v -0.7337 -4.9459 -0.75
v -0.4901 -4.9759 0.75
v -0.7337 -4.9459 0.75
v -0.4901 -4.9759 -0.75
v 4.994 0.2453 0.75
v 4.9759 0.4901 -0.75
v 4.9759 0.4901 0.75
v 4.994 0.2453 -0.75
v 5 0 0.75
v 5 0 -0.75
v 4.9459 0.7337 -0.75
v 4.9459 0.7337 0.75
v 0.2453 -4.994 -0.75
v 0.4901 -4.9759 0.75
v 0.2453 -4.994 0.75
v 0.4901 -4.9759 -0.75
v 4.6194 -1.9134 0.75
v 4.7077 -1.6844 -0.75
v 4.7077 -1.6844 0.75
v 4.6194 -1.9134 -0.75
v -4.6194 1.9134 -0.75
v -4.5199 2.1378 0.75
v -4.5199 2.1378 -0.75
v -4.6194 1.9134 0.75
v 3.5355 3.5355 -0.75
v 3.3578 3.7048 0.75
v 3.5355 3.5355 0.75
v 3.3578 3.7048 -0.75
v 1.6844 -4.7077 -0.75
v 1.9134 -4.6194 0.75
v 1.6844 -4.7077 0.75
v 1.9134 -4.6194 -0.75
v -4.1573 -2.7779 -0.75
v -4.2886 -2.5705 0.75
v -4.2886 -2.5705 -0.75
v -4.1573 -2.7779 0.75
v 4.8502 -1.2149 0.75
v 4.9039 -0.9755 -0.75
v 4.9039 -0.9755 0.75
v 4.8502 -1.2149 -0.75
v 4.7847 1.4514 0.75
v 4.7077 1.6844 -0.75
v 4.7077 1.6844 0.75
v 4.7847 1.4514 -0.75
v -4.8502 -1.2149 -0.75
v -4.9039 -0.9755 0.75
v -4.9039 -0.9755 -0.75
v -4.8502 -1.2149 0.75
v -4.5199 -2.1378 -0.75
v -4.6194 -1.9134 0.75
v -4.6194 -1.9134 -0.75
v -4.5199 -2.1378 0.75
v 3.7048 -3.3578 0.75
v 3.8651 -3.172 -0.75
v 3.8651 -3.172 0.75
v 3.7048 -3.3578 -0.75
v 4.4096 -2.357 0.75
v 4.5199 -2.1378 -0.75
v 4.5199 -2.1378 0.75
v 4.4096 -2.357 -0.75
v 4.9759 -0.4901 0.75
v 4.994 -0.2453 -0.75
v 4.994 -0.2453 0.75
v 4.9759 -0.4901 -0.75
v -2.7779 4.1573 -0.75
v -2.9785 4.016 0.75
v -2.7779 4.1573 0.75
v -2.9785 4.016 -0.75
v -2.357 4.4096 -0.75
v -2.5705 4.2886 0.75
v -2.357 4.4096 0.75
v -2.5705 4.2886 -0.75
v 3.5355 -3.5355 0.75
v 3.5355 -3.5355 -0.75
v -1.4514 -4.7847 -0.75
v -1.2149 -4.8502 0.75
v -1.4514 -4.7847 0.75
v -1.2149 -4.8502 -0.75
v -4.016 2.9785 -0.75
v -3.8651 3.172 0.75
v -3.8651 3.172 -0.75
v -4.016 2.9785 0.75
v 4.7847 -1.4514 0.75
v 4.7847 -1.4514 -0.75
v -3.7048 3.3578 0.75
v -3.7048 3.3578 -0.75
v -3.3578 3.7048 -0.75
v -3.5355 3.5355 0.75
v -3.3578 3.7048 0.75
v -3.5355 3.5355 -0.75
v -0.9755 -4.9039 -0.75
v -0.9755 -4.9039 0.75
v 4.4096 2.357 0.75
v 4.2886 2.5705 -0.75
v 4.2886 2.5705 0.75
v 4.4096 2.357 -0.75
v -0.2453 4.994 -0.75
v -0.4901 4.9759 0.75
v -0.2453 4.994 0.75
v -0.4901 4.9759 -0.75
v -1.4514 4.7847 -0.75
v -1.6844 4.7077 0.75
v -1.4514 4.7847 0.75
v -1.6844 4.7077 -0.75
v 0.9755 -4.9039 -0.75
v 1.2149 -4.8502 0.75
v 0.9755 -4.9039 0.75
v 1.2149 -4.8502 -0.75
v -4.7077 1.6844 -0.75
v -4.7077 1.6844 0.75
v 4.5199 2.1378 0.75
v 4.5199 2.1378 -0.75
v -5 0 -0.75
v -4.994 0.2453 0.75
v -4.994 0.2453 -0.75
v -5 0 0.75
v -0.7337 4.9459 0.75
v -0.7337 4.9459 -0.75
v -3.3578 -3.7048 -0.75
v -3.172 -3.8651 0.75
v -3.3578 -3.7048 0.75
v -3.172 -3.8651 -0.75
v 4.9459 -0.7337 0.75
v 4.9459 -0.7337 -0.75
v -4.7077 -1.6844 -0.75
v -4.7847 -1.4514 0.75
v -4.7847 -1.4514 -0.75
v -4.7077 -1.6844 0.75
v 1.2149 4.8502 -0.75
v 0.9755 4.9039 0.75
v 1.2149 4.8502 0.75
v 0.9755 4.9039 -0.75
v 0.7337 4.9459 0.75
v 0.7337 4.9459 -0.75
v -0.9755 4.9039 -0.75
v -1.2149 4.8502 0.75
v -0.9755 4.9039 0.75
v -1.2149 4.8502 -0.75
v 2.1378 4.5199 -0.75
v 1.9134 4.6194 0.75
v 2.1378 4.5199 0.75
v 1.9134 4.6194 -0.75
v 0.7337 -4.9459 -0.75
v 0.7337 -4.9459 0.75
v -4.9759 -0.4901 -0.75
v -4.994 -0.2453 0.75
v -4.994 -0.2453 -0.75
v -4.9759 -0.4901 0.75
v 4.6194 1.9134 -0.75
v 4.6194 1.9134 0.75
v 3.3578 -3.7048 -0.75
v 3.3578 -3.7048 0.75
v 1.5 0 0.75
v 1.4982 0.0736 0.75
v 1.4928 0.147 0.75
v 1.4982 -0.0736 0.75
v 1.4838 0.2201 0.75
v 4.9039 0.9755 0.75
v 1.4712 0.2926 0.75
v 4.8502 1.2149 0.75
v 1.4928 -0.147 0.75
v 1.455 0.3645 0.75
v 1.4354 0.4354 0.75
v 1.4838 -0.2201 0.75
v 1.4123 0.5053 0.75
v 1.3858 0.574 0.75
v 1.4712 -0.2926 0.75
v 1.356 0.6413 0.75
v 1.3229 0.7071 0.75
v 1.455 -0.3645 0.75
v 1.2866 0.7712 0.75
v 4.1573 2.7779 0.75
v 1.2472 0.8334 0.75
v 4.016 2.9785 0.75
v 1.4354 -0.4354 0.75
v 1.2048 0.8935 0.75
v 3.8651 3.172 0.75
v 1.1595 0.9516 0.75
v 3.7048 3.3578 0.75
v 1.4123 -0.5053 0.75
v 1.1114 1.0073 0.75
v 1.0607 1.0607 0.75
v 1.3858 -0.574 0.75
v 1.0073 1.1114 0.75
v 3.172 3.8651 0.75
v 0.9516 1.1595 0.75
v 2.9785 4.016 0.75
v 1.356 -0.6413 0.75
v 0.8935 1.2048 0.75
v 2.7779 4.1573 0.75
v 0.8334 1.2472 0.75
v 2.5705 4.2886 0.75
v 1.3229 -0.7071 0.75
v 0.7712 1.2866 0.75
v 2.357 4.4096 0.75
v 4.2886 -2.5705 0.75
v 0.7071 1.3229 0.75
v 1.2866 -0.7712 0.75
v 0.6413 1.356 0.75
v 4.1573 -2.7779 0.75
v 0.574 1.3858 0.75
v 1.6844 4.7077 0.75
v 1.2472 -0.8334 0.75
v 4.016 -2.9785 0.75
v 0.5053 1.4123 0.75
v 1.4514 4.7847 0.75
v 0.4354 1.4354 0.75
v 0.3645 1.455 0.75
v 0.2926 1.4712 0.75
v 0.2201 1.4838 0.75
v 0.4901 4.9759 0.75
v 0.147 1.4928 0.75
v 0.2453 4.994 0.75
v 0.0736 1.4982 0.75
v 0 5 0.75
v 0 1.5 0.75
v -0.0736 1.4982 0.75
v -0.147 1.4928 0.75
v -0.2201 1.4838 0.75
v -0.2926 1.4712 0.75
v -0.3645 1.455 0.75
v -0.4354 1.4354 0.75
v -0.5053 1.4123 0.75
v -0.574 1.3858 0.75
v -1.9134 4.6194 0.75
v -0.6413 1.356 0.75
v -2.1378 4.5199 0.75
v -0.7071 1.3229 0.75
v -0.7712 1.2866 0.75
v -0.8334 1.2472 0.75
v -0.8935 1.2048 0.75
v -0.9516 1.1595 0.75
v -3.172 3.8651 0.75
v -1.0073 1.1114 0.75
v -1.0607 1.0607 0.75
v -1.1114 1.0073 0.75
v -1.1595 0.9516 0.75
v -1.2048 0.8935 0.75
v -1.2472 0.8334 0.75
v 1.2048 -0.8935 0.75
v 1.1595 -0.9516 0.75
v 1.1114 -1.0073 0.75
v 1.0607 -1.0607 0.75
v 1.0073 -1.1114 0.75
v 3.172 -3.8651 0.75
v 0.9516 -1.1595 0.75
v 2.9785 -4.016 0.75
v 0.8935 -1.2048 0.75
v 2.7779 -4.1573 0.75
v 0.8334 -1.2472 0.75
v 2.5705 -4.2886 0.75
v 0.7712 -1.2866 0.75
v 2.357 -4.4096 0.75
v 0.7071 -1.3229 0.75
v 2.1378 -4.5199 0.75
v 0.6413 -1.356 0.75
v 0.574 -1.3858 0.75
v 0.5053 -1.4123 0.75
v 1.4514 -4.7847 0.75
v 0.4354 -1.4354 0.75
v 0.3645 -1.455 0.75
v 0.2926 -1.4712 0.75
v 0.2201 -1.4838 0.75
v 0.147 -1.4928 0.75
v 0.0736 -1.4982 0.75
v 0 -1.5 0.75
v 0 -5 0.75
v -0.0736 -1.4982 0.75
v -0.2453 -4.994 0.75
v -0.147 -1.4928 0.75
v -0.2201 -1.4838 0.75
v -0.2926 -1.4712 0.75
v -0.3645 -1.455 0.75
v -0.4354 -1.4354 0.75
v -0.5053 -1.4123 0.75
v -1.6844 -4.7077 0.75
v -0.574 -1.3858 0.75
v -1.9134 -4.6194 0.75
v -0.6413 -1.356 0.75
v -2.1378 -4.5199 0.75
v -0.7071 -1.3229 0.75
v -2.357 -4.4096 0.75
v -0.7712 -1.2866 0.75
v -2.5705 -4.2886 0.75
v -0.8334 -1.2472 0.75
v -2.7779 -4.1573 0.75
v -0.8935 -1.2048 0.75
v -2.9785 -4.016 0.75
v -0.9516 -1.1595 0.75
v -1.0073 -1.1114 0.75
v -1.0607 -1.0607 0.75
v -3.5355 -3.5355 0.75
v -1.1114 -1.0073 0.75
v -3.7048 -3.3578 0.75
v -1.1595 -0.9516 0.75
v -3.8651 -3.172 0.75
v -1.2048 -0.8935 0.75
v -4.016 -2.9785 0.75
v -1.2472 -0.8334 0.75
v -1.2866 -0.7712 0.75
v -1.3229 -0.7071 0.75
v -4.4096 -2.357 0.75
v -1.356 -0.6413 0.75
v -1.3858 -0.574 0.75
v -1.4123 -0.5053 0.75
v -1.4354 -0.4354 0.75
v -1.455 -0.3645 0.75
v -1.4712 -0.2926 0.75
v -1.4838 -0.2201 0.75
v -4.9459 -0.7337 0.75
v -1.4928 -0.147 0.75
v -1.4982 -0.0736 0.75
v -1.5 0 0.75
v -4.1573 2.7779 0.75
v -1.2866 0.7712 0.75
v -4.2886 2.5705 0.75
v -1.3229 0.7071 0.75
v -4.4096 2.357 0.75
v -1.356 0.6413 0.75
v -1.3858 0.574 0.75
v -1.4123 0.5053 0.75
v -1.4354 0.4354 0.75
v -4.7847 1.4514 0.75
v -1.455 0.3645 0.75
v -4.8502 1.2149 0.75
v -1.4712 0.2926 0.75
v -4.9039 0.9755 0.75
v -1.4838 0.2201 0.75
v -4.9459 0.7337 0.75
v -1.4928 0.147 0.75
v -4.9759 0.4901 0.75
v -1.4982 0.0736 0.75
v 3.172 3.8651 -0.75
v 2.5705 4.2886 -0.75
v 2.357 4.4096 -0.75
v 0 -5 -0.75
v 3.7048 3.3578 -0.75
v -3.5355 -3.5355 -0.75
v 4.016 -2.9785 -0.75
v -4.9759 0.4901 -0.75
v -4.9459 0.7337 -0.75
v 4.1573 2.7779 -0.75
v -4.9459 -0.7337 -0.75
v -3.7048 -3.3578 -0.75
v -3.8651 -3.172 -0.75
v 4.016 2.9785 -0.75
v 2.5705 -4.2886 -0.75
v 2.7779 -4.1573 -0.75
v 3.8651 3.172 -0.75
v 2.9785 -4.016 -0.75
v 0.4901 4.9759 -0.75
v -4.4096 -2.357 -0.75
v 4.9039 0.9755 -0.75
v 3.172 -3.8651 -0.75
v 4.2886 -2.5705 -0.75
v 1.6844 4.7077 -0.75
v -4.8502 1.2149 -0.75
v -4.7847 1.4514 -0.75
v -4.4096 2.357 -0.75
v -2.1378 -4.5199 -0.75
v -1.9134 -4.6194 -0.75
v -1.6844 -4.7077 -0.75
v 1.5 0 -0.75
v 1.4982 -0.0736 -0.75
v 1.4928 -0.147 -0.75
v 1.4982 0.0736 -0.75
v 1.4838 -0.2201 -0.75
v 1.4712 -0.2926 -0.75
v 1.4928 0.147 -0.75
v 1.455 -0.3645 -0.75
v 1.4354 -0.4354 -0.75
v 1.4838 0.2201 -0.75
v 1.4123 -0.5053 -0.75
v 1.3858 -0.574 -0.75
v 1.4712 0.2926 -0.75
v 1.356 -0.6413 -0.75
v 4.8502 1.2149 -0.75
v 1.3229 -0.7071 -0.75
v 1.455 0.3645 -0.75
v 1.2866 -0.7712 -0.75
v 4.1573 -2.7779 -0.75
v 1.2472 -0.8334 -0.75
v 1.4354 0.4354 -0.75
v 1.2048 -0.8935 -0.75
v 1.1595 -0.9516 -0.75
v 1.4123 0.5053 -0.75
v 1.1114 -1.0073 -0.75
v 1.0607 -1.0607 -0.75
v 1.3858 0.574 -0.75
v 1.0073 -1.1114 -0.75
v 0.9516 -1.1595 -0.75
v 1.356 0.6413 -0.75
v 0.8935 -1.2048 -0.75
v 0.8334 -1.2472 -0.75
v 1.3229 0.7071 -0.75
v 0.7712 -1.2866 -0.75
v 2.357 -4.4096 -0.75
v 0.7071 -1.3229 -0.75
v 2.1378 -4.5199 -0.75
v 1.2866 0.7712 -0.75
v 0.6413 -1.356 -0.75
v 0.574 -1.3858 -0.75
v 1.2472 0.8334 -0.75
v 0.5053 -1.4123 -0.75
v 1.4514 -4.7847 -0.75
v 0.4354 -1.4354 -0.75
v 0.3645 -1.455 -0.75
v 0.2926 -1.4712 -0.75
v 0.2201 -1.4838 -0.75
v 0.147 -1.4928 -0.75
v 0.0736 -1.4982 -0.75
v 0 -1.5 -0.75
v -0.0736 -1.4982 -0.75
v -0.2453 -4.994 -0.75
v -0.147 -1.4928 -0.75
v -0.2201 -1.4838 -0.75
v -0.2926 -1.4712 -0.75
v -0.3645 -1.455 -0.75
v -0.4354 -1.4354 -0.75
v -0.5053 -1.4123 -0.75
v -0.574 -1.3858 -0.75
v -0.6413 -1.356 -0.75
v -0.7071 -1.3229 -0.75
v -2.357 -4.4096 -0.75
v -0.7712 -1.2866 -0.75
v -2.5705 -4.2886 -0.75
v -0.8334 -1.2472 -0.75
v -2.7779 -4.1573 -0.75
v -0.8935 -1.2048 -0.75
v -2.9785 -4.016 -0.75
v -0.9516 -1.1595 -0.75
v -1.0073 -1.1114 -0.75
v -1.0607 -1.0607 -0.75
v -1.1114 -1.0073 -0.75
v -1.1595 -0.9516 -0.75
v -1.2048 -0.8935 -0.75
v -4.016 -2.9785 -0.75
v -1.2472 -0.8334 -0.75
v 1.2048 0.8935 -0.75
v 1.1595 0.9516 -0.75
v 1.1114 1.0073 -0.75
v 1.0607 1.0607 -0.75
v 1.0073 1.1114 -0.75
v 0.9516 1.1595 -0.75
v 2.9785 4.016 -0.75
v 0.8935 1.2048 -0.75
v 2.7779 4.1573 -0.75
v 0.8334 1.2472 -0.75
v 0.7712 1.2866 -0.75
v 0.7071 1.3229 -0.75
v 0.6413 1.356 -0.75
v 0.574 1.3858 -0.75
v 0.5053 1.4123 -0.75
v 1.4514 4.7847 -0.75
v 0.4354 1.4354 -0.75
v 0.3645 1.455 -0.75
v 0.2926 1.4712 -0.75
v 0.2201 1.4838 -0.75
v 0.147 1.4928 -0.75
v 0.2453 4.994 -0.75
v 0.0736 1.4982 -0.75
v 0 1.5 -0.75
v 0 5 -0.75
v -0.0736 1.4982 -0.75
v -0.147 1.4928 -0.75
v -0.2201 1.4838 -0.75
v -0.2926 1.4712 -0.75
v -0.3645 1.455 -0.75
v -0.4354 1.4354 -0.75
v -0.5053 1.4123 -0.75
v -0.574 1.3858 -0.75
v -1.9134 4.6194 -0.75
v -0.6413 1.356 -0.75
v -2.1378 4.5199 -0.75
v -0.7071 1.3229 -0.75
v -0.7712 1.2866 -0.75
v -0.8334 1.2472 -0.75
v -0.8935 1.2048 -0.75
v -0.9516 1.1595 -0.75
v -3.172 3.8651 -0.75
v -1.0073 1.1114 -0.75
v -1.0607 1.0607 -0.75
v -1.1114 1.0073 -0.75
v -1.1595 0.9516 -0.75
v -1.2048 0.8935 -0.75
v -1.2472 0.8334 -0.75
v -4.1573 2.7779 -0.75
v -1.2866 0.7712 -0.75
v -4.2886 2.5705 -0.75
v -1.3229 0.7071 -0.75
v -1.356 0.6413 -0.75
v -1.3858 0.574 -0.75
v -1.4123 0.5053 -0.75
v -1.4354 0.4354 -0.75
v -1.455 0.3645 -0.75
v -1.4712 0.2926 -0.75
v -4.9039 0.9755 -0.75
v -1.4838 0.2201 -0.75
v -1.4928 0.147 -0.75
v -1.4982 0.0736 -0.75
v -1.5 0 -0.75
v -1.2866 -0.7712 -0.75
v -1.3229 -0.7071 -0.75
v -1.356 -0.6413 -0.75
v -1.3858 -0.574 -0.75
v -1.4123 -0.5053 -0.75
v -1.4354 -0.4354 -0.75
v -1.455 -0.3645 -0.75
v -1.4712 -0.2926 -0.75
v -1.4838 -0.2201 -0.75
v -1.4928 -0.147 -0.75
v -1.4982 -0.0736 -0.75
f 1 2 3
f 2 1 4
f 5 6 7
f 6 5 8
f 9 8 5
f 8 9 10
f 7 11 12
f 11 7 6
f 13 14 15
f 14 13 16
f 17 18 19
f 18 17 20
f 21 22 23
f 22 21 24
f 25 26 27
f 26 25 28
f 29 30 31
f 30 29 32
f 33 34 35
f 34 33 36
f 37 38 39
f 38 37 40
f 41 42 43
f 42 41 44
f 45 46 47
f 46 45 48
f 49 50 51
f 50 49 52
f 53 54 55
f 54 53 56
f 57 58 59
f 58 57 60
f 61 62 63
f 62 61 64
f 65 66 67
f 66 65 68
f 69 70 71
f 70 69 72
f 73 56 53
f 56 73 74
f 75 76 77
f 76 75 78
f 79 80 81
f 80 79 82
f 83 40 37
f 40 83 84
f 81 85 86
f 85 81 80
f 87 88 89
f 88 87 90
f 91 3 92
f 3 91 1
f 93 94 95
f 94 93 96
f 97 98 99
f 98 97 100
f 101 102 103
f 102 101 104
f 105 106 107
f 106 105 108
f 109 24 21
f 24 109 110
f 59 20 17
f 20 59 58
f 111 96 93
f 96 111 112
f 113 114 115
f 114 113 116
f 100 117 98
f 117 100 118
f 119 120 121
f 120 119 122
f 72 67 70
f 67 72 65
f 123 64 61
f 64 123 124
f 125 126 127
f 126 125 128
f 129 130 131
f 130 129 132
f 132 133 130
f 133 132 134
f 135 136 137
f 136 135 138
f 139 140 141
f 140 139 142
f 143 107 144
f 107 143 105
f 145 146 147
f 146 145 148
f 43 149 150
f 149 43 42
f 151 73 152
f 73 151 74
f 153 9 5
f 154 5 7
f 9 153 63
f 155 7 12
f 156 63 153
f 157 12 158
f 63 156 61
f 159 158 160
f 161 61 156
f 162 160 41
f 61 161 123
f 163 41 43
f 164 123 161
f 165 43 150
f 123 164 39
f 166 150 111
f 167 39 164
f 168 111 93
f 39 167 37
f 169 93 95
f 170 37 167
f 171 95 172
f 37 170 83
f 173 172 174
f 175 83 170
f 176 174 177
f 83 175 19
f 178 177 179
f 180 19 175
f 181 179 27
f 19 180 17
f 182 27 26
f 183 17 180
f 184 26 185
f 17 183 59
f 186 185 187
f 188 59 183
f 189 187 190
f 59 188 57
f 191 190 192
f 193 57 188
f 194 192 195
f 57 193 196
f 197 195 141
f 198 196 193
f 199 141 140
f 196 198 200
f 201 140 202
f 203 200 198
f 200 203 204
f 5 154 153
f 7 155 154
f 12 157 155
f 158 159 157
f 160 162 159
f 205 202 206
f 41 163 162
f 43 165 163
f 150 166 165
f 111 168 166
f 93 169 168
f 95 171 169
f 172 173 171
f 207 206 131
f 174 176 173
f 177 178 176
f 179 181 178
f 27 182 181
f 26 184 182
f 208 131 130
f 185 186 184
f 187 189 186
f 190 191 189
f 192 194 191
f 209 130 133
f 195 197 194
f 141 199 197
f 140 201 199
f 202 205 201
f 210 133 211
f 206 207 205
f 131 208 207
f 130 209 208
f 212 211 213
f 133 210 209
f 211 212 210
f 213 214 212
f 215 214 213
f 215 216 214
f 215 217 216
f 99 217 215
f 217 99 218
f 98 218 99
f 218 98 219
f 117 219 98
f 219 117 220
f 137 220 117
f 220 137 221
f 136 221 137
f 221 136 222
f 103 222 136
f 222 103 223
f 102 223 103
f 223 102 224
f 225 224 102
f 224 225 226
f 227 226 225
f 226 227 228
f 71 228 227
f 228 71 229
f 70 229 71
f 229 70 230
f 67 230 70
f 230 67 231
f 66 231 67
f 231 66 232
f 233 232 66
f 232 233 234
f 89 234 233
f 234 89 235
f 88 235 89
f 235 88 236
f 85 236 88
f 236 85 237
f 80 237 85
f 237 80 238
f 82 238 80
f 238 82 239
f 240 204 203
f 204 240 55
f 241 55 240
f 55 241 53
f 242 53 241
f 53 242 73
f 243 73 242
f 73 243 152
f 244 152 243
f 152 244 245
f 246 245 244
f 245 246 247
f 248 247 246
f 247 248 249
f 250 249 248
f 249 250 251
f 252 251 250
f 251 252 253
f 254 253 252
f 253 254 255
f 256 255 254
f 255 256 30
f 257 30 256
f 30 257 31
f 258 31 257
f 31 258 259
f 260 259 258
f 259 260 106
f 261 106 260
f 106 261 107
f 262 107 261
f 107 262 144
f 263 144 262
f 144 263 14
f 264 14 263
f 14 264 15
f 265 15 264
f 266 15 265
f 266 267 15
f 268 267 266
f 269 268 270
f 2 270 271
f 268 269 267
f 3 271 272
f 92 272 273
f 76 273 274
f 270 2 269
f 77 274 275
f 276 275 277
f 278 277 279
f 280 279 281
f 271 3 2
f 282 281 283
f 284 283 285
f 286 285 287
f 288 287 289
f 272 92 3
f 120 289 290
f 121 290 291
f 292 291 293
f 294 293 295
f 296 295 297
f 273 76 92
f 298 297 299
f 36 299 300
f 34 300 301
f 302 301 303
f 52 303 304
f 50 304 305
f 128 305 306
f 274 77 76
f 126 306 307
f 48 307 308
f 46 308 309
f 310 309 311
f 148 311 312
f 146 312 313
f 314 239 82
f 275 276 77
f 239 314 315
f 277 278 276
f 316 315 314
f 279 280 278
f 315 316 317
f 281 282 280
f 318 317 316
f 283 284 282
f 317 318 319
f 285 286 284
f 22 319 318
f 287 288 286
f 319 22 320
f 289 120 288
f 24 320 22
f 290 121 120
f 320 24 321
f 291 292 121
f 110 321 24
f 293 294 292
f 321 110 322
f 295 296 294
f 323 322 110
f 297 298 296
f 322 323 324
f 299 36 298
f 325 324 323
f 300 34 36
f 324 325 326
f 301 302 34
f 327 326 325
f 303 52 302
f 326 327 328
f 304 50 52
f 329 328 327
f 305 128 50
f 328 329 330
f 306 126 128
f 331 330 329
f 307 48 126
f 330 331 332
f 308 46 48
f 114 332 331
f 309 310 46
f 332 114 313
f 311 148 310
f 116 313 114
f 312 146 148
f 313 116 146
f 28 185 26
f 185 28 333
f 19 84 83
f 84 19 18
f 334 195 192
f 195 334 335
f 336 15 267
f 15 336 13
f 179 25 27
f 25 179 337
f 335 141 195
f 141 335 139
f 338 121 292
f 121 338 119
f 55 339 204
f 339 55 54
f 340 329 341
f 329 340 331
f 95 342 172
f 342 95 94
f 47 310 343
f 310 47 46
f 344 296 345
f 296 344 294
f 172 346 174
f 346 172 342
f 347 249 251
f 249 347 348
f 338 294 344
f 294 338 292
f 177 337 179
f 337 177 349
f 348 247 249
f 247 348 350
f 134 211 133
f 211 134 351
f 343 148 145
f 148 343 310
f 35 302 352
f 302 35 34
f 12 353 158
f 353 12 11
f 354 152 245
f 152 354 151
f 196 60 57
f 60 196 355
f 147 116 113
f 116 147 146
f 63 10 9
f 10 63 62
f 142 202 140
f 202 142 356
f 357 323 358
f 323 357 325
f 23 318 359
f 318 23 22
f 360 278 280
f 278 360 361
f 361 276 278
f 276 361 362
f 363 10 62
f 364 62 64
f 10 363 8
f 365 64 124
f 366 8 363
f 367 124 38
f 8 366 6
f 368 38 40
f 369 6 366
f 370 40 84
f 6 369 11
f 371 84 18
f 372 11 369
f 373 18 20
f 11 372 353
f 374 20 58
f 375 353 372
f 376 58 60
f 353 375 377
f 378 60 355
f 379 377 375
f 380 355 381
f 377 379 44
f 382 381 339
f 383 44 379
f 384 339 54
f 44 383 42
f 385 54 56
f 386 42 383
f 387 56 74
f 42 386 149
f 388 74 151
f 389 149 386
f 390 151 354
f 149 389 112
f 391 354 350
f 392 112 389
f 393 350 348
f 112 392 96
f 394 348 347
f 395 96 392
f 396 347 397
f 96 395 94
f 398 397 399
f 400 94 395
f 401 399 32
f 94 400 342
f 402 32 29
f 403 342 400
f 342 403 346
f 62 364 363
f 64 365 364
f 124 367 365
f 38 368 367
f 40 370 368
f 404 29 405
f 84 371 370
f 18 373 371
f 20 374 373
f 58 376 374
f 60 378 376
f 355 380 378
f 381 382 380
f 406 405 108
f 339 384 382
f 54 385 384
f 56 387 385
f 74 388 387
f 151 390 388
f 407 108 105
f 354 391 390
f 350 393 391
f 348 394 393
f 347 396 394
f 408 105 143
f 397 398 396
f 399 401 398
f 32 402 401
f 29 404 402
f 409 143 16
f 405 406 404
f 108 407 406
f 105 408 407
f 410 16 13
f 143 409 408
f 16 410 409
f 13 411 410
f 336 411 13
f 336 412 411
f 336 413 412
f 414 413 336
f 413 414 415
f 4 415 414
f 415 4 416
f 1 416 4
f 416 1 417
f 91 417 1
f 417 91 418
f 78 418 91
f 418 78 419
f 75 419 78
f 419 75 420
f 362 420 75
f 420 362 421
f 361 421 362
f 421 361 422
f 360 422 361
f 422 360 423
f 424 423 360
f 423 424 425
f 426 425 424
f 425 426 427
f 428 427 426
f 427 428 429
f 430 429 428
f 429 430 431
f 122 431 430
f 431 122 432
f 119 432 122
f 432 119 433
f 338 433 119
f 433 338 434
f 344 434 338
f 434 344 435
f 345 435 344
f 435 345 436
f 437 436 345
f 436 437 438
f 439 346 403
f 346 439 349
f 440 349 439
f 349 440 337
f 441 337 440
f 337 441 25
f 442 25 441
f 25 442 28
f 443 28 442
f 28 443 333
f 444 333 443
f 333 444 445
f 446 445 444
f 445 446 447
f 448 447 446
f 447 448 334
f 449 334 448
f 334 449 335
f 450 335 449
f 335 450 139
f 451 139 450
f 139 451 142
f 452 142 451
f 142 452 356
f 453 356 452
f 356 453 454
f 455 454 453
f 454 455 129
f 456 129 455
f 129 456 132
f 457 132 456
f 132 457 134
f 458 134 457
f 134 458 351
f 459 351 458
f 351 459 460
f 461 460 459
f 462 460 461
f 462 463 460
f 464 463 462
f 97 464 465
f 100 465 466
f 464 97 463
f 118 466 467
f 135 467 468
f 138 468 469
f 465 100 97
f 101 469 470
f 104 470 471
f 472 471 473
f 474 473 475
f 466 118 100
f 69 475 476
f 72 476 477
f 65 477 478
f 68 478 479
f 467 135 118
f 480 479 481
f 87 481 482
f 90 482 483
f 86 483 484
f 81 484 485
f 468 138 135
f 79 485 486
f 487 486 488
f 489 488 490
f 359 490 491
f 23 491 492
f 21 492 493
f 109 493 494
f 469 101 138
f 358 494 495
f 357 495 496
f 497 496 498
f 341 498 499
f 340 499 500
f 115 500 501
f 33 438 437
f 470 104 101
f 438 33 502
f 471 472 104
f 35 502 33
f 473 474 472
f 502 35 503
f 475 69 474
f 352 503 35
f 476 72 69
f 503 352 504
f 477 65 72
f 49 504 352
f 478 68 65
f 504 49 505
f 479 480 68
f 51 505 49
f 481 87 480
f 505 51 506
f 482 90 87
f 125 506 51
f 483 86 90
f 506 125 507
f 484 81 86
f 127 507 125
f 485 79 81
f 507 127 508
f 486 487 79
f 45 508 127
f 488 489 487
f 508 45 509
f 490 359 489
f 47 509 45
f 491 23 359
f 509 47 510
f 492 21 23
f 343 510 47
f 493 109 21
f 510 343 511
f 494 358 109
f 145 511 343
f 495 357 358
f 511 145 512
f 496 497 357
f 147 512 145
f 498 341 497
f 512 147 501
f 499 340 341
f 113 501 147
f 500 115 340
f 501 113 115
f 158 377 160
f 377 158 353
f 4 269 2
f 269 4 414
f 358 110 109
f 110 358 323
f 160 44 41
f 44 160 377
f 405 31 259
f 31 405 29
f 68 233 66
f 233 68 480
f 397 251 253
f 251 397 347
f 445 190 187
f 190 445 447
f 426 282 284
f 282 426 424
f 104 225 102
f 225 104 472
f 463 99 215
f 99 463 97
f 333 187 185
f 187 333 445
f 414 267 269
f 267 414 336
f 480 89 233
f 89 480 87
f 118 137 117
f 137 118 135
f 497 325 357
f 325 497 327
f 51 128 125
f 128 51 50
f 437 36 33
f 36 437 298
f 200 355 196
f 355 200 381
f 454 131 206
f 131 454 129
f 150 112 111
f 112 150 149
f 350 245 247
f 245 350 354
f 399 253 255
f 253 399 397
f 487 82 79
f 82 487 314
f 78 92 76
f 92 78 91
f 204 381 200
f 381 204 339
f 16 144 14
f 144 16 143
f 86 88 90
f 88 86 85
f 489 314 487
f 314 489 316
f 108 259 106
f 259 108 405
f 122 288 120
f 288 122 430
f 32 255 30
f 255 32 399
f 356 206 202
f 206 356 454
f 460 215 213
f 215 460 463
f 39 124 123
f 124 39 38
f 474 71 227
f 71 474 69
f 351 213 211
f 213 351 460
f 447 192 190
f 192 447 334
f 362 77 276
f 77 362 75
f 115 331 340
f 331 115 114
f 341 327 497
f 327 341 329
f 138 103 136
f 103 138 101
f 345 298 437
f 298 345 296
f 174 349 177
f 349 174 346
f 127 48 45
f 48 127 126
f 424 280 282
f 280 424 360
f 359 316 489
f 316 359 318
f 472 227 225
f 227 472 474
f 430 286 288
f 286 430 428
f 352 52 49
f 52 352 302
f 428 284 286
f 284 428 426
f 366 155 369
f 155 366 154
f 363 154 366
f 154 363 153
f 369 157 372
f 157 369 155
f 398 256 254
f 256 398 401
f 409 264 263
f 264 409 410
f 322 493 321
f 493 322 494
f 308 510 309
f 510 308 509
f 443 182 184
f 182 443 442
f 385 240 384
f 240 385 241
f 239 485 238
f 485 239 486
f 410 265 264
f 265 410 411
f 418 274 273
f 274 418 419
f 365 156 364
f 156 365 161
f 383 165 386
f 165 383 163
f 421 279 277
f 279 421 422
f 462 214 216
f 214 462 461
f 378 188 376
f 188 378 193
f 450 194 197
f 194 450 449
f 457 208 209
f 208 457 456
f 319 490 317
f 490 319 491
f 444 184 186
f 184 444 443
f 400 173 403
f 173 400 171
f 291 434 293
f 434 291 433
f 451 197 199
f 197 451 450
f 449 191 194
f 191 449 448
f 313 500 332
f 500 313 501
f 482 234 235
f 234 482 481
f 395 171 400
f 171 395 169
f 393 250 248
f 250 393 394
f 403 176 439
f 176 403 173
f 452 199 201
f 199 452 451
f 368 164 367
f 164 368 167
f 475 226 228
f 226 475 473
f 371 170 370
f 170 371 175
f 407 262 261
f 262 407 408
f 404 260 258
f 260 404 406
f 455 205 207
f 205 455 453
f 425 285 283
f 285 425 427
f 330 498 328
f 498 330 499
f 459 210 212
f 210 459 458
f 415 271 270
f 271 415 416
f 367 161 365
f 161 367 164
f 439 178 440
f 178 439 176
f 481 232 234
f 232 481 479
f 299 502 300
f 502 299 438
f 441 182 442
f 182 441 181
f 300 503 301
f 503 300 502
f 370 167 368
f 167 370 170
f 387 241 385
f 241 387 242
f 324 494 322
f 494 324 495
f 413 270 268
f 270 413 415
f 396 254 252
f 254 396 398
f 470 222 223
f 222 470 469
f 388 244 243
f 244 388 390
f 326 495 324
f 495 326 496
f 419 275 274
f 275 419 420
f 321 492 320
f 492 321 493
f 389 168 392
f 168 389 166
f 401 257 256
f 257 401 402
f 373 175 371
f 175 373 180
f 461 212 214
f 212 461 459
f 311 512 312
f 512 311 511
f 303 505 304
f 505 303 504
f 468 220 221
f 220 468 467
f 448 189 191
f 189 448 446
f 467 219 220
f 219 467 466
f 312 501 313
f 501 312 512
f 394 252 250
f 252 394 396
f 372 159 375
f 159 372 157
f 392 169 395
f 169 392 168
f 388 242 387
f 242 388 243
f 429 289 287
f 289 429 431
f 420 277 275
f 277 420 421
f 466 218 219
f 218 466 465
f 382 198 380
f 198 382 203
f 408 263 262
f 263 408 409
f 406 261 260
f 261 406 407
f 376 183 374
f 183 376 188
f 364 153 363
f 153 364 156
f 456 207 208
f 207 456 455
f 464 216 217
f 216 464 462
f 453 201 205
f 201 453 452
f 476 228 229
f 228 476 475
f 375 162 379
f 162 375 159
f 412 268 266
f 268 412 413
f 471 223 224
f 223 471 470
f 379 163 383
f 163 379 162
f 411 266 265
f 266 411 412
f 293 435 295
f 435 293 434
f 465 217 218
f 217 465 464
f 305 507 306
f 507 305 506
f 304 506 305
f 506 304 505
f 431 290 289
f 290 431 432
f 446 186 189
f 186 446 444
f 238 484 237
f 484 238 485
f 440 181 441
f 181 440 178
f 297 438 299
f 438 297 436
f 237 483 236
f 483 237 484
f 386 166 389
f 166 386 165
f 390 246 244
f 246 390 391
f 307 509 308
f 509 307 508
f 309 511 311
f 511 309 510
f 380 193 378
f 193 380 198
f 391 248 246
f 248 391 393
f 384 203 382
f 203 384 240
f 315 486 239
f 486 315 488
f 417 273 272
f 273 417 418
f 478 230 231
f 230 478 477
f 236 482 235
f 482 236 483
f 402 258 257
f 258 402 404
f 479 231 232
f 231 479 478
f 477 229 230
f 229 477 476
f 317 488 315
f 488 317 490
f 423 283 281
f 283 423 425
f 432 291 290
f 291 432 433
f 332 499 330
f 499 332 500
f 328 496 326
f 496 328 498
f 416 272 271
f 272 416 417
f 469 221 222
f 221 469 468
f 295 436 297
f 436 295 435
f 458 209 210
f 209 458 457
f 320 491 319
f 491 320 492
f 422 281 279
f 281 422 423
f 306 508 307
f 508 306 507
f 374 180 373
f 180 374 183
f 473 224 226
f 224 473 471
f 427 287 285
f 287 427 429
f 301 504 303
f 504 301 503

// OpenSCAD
$fn=128;

module washer(id=3.0, od=10.0, thickness=1.5) {
    difference() {
        cylinder(h=thickness, d=od, center=true);
        cylinder(h=thickness + 0.2, d=id, center=true);
    }
}

washer(id=3.0, od=10.0, thickness=1.5);
